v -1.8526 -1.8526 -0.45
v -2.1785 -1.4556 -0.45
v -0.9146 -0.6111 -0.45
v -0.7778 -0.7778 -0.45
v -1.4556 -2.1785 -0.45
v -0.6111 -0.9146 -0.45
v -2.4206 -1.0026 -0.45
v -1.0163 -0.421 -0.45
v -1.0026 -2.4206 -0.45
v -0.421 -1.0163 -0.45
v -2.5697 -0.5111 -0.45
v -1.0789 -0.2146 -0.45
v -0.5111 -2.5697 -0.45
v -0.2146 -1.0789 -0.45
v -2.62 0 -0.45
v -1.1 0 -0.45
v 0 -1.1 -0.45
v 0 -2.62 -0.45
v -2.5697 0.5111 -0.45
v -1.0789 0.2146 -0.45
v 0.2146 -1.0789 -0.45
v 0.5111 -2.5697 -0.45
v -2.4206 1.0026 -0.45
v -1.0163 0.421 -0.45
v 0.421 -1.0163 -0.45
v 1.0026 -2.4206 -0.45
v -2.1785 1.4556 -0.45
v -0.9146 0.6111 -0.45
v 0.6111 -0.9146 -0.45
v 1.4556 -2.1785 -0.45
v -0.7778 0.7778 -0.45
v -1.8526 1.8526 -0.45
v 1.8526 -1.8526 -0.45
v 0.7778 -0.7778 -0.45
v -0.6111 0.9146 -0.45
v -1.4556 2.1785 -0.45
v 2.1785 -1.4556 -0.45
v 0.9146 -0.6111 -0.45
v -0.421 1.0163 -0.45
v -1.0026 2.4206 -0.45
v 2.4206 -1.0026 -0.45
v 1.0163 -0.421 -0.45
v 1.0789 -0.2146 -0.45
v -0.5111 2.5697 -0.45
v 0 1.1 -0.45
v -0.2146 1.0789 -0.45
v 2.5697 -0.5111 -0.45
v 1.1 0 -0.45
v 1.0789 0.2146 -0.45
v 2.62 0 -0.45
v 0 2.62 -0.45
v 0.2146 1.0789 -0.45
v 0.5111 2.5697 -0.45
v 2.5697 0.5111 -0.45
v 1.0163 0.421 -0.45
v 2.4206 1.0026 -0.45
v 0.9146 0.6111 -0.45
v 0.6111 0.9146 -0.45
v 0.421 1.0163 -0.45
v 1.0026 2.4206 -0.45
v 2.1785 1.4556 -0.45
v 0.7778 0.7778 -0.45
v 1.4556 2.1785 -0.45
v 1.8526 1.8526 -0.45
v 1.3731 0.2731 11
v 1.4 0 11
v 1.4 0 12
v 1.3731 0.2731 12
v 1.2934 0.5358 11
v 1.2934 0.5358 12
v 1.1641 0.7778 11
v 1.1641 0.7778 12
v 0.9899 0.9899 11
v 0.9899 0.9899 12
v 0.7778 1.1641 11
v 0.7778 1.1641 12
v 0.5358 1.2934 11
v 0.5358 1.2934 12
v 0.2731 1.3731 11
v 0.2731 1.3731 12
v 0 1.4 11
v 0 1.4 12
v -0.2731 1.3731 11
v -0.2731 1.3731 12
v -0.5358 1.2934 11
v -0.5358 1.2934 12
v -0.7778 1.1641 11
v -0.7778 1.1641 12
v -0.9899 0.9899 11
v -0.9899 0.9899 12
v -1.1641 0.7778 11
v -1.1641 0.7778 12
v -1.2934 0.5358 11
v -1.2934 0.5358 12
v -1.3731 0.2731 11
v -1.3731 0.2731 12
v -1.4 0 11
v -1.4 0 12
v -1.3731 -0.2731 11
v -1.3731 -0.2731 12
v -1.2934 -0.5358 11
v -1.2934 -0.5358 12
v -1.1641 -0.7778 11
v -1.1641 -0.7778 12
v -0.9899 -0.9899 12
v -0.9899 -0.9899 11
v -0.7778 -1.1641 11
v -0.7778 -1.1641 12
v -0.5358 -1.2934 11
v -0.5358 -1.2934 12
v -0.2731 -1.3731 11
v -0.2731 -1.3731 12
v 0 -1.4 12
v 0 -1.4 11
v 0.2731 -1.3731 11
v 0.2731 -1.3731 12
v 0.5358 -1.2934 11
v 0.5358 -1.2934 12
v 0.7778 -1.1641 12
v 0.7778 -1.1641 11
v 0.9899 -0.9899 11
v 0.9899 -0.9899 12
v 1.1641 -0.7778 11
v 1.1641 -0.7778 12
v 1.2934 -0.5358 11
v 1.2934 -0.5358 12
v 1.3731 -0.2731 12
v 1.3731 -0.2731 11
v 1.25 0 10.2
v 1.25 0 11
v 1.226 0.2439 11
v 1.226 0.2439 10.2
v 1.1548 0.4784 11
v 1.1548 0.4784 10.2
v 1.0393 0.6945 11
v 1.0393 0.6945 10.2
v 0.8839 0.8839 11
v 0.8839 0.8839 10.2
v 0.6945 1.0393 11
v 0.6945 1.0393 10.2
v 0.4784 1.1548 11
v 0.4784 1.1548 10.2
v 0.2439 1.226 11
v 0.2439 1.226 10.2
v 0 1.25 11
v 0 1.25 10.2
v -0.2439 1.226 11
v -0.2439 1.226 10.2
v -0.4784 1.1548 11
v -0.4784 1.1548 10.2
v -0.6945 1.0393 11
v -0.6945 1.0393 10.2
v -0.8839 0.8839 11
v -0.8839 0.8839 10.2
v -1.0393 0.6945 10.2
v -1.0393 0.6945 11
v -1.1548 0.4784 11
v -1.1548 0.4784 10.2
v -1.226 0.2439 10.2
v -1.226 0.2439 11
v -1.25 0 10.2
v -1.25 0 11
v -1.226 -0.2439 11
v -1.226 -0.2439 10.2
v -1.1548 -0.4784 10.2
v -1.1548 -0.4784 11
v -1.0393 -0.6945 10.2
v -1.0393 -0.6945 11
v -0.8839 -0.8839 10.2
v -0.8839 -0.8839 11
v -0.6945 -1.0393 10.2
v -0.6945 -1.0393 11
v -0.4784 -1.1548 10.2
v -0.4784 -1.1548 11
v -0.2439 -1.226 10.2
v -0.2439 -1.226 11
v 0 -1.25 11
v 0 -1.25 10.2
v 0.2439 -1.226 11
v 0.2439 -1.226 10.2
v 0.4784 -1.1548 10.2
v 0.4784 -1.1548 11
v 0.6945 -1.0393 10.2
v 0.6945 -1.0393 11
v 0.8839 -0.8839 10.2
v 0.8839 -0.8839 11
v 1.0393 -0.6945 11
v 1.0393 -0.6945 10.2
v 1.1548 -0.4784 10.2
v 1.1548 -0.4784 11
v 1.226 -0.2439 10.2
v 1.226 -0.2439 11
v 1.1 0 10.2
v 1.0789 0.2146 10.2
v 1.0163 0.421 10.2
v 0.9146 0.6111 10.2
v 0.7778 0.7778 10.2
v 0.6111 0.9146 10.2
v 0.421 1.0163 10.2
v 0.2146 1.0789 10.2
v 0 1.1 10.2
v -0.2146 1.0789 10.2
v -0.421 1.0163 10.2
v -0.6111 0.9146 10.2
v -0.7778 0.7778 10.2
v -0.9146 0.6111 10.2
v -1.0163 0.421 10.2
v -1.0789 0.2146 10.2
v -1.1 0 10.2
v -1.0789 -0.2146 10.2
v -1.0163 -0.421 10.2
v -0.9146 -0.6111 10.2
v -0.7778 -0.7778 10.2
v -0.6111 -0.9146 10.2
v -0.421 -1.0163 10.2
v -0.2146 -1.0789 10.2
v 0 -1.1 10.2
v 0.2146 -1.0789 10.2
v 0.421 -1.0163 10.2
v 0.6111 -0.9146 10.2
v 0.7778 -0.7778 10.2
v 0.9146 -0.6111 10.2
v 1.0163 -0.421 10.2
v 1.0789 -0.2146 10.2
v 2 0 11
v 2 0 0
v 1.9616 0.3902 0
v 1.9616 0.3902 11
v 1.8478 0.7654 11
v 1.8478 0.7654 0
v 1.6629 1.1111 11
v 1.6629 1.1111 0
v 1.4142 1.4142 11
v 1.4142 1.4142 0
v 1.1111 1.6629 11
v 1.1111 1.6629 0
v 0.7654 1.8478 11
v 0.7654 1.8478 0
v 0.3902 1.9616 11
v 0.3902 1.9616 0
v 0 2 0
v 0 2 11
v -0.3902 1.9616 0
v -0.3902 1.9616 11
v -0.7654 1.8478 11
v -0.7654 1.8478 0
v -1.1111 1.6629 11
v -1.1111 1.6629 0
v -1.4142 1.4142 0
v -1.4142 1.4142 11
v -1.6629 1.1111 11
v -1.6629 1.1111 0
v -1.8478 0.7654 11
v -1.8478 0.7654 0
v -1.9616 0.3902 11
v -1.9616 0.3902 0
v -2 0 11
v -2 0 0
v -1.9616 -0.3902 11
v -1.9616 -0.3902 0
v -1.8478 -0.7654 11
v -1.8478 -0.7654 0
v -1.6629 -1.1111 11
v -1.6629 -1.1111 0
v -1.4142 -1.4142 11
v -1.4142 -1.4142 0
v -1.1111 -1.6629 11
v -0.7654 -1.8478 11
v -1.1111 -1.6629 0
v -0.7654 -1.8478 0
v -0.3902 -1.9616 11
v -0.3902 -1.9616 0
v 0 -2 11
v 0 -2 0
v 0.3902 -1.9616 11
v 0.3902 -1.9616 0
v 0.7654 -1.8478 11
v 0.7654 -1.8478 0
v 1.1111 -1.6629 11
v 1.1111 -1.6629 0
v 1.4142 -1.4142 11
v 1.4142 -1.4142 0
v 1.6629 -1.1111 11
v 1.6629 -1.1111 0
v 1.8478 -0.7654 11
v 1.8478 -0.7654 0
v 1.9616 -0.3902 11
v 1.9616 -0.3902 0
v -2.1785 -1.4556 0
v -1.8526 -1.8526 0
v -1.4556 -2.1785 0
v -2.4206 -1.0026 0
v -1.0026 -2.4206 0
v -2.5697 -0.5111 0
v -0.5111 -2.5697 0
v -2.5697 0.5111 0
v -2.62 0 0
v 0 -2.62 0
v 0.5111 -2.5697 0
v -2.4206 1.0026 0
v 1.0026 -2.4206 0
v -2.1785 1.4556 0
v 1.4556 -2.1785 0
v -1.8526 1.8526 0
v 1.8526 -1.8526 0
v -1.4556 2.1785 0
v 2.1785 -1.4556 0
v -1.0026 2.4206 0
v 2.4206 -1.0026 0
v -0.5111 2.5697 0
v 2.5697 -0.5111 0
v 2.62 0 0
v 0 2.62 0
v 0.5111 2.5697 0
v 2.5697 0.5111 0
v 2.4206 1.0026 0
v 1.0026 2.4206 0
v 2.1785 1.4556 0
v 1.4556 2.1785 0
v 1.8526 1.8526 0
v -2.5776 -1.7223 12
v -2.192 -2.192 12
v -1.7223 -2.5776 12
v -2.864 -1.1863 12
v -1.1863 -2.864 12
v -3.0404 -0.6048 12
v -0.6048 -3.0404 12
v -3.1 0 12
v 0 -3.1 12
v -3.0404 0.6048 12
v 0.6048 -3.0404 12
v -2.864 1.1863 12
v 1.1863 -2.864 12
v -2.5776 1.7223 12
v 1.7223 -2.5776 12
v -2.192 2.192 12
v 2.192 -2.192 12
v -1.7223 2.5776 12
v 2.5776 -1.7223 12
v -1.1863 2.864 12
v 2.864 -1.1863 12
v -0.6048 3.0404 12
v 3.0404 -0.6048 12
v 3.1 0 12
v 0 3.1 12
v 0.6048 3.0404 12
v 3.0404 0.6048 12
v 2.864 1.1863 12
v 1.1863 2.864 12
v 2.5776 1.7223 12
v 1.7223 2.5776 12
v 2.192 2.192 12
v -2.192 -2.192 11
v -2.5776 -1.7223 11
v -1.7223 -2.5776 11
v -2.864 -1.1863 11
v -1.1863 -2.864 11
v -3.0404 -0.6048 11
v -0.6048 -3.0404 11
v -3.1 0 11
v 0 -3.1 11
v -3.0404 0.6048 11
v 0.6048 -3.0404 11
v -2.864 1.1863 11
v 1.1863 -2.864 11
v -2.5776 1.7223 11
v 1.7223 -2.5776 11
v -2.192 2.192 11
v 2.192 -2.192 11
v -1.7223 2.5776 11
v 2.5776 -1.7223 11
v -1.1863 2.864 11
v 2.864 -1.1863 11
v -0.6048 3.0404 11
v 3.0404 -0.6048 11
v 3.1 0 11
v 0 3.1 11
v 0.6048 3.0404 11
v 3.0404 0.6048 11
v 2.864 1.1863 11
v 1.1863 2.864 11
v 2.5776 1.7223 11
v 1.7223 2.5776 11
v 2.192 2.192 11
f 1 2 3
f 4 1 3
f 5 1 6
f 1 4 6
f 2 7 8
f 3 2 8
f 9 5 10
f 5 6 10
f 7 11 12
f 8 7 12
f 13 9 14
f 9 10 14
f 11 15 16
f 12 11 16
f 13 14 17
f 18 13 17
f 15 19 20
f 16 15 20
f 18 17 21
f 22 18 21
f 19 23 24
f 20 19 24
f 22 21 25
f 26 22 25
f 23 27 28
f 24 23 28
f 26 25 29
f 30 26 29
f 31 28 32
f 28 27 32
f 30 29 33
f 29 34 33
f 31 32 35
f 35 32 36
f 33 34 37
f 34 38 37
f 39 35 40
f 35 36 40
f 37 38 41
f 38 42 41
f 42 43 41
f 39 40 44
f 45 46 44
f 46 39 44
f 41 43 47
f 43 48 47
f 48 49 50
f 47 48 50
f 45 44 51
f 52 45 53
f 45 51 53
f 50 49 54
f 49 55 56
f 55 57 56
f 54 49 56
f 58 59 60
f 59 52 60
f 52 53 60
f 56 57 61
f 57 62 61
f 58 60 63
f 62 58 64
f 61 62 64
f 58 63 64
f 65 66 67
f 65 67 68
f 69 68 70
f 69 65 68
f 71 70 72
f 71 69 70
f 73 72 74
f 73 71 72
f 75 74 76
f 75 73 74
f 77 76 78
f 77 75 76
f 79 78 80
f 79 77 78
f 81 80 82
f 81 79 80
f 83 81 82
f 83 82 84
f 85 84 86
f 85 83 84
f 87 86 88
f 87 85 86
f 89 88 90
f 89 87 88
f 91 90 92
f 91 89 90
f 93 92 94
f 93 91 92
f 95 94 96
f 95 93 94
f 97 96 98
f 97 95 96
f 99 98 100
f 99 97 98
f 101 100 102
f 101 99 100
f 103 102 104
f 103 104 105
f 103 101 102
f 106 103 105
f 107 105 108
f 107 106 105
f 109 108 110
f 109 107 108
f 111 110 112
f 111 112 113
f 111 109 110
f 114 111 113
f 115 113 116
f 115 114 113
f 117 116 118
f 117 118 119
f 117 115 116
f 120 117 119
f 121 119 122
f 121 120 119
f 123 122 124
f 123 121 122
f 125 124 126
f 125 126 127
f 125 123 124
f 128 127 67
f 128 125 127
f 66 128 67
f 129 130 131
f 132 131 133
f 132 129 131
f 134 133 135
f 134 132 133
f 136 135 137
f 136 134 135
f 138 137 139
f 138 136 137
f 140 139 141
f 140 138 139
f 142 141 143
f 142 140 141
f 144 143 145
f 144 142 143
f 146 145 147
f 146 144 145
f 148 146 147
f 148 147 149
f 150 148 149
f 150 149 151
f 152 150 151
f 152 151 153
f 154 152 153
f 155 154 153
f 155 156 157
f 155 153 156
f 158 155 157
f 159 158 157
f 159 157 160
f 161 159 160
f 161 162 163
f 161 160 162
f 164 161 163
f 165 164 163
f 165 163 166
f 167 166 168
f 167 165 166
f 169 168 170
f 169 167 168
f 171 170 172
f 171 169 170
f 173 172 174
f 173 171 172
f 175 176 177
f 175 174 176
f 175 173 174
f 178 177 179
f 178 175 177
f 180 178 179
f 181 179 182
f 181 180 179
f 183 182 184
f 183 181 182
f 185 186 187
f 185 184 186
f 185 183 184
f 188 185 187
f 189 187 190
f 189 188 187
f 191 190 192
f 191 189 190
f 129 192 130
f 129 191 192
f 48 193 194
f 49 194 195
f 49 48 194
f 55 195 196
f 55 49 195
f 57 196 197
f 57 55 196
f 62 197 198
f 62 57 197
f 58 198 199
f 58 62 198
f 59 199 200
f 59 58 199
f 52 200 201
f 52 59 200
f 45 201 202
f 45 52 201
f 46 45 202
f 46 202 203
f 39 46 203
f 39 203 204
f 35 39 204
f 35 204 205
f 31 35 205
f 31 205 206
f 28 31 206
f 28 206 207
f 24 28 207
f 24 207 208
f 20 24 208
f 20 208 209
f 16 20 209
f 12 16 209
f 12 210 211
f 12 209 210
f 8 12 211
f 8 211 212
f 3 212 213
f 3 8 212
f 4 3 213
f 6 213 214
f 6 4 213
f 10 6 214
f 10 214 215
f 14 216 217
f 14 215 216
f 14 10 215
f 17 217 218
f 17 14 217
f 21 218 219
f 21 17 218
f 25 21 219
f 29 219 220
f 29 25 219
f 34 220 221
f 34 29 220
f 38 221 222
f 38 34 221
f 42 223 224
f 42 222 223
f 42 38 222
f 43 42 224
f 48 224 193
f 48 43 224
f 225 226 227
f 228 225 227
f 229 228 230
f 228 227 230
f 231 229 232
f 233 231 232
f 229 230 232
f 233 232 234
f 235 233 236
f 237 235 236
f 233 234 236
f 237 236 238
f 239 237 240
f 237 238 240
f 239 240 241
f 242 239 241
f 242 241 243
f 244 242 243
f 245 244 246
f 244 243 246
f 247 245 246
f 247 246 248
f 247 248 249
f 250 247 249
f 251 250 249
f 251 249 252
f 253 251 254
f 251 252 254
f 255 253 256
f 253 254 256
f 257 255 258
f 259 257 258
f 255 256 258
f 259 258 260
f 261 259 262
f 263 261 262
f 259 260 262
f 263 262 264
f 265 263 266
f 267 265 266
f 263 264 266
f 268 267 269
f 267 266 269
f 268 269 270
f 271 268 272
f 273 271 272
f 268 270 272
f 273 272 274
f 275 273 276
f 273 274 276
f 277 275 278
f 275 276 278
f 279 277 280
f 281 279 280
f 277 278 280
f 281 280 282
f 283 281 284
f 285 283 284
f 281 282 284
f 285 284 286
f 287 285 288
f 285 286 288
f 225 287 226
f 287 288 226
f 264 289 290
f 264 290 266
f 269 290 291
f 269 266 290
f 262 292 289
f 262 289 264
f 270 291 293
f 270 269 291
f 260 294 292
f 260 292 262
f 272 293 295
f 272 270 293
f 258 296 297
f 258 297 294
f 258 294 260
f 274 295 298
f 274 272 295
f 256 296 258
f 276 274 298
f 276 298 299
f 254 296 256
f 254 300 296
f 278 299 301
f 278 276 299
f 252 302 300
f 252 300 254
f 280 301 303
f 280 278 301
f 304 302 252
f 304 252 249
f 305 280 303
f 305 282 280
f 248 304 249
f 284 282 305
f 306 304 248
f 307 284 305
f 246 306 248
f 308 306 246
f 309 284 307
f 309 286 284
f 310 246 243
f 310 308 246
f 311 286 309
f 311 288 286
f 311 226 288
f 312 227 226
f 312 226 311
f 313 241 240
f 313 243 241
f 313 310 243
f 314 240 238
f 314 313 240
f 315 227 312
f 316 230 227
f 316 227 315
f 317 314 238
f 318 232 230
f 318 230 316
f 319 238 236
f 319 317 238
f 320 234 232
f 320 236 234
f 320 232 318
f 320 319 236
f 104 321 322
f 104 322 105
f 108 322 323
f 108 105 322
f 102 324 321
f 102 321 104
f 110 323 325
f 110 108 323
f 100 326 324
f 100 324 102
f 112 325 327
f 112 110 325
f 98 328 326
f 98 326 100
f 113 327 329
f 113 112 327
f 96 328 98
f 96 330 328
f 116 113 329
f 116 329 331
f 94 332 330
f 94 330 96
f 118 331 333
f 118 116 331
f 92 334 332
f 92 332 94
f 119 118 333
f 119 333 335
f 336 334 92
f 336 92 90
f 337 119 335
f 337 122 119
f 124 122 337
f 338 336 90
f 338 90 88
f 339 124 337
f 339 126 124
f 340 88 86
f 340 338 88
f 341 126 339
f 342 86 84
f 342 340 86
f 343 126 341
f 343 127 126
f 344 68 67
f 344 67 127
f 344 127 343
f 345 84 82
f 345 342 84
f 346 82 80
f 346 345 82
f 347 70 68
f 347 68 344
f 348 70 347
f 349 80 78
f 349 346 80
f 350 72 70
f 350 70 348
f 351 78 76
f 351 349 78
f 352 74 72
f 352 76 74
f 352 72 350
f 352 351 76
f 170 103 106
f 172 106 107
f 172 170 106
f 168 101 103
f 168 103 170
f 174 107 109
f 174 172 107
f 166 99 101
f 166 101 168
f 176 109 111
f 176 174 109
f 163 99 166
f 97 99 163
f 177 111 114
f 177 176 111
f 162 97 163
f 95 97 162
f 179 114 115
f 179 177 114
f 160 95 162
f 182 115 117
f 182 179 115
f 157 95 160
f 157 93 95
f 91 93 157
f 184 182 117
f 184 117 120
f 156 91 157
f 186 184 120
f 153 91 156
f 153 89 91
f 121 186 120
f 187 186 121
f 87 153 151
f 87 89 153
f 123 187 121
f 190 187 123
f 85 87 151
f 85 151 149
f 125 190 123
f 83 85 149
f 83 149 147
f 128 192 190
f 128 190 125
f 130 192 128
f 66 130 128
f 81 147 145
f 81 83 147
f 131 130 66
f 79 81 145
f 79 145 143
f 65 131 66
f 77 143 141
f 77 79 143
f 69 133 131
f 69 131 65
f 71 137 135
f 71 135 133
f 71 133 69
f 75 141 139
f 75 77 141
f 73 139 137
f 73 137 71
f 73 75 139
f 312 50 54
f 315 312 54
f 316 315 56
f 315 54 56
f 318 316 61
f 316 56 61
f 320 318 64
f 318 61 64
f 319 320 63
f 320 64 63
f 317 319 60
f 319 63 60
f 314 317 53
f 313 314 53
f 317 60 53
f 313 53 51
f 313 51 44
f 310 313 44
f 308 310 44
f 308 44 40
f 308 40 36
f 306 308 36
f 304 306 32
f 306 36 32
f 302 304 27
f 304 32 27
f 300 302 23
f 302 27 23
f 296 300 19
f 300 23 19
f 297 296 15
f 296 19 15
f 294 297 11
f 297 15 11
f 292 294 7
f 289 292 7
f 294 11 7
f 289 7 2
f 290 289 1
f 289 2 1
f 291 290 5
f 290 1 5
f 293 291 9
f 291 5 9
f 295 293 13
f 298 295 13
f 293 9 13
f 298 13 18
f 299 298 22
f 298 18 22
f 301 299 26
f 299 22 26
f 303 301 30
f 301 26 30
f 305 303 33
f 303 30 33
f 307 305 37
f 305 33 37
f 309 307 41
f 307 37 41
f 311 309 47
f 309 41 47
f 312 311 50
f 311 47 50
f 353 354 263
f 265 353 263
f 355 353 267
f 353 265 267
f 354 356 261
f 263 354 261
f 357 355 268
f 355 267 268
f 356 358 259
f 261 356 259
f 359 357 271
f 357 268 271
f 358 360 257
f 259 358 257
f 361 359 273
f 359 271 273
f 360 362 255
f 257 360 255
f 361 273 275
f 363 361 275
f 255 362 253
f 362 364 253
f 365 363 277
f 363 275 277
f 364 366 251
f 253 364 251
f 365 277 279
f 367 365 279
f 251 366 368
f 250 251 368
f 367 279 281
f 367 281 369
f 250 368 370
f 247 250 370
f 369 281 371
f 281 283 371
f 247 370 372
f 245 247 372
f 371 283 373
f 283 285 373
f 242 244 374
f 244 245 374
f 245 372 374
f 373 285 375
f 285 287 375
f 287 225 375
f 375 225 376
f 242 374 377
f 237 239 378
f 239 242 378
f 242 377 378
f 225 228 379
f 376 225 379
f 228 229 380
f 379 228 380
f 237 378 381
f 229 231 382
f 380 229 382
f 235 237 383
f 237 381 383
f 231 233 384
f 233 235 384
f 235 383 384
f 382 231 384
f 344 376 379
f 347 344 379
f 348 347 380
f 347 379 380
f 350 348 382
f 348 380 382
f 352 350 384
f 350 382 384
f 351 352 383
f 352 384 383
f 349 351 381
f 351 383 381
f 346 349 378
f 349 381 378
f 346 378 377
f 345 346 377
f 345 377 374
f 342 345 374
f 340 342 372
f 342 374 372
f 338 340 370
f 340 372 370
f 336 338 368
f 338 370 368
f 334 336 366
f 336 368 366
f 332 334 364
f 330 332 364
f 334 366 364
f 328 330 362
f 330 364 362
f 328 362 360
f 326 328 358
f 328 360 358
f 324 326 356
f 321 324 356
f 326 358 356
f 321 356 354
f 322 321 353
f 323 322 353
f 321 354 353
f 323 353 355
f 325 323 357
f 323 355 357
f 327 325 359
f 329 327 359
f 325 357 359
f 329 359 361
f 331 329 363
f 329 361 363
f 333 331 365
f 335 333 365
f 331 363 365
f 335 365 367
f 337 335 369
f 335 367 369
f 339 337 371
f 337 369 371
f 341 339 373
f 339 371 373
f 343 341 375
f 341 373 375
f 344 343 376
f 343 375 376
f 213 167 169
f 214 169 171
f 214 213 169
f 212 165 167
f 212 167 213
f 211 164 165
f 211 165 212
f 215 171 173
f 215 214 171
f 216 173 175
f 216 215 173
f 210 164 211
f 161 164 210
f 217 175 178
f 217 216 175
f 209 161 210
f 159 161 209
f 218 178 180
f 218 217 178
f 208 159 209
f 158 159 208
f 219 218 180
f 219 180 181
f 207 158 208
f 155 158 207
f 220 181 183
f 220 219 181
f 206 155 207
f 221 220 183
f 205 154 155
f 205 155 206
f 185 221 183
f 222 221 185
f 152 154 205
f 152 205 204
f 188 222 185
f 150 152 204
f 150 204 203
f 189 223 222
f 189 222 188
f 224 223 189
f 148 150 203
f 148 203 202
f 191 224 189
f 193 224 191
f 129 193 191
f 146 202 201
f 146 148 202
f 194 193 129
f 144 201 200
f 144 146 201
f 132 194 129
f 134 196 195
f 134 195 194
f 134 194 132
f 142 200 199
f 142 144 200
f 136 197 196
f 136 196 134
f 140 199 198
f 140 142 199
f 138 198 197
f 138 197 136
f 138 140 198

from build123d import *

# Parameters (mm, degrees)
S01_CORD_EYE_LINER_R                 = 2
S01_CORD_EYE_LINER_R_2               = 1.1
F_01_CORD_EYE_LINER_DEPTH            = 11
F_02_START                           = -0.45
S02_SWAGED_REAR_RETENTION_LIP_R      = 2.62
S02_SWAGED_REAR_RETENTION_LIP_R_2    = 1.1
F_02_SWAGED_REAR_RETENTION_LIP_DEPTH = 0.45
F_03_START                           = 11
S03_MOUTH_FLANGE_R                   = 3.1
S03_MOUTH_FLANGE_R_2                 = 1.4
F_03_MOUTH_FLANGE_DEPTH              = 1
F_04_START                           = 10.2
S04_INLET_RELIEF_R                   = 1.25
F_04_INLET_RELIEF_DEPTH              = 0.9


with BuildPart() as part:
    # S01 - Cord eye liner → 01 - Cord eye liner (new body)
    with BuildSketch(Plane.XY):
        Circle(S01_CORD_EYE_LINER_R)
        Circle(S01_CORD_EYE_LINER_R_2, mode=Mode.SUBTRACT)
    extrude(amount=F_01_CORD_EYE_LINER_DEPTH)

    # S02 - Swaged rear retention lip → 02 - Swaged rear retention lip (add)
    with BuildSketch(Plane.XY.offset(F_02_START)):
        Circle(S02_SWAGED_REAR_RETENTION_LIP_R)
        Circle(S02_SWAGED_REAR_RETENTION_LIP_R_2, mode=Mode.SUBTRACT)
    extrude(amount=F_02_SWAGED_REAR_RETENTION_LIP_DEPTH)

    # S03 - Mouth flange → 03 - Mouth flange (add)
    with BuildSketch(Plane.XY.offset(F_03_START)):
        Circle(S03_MOUTH_FLANGE_R)
        Circle(S03_MOUTH_FLANGE_R_2, mode=Mode.SUBTRACT)
    extrude(amount=F_03_MOUTH_FLANGE_DEPTH)

    # S04 - Inlet relief → 04 - Inlet relief (cut)
    with BuildSketch(Plane.XY.offset(F_04_START)):
        Circle(S04_INLET_RELIEF_R)
    extrude(amount=F_04_INLET_RELIEF_DEPTH, mode=Mode.SUBTRACT)


solid = part.part
